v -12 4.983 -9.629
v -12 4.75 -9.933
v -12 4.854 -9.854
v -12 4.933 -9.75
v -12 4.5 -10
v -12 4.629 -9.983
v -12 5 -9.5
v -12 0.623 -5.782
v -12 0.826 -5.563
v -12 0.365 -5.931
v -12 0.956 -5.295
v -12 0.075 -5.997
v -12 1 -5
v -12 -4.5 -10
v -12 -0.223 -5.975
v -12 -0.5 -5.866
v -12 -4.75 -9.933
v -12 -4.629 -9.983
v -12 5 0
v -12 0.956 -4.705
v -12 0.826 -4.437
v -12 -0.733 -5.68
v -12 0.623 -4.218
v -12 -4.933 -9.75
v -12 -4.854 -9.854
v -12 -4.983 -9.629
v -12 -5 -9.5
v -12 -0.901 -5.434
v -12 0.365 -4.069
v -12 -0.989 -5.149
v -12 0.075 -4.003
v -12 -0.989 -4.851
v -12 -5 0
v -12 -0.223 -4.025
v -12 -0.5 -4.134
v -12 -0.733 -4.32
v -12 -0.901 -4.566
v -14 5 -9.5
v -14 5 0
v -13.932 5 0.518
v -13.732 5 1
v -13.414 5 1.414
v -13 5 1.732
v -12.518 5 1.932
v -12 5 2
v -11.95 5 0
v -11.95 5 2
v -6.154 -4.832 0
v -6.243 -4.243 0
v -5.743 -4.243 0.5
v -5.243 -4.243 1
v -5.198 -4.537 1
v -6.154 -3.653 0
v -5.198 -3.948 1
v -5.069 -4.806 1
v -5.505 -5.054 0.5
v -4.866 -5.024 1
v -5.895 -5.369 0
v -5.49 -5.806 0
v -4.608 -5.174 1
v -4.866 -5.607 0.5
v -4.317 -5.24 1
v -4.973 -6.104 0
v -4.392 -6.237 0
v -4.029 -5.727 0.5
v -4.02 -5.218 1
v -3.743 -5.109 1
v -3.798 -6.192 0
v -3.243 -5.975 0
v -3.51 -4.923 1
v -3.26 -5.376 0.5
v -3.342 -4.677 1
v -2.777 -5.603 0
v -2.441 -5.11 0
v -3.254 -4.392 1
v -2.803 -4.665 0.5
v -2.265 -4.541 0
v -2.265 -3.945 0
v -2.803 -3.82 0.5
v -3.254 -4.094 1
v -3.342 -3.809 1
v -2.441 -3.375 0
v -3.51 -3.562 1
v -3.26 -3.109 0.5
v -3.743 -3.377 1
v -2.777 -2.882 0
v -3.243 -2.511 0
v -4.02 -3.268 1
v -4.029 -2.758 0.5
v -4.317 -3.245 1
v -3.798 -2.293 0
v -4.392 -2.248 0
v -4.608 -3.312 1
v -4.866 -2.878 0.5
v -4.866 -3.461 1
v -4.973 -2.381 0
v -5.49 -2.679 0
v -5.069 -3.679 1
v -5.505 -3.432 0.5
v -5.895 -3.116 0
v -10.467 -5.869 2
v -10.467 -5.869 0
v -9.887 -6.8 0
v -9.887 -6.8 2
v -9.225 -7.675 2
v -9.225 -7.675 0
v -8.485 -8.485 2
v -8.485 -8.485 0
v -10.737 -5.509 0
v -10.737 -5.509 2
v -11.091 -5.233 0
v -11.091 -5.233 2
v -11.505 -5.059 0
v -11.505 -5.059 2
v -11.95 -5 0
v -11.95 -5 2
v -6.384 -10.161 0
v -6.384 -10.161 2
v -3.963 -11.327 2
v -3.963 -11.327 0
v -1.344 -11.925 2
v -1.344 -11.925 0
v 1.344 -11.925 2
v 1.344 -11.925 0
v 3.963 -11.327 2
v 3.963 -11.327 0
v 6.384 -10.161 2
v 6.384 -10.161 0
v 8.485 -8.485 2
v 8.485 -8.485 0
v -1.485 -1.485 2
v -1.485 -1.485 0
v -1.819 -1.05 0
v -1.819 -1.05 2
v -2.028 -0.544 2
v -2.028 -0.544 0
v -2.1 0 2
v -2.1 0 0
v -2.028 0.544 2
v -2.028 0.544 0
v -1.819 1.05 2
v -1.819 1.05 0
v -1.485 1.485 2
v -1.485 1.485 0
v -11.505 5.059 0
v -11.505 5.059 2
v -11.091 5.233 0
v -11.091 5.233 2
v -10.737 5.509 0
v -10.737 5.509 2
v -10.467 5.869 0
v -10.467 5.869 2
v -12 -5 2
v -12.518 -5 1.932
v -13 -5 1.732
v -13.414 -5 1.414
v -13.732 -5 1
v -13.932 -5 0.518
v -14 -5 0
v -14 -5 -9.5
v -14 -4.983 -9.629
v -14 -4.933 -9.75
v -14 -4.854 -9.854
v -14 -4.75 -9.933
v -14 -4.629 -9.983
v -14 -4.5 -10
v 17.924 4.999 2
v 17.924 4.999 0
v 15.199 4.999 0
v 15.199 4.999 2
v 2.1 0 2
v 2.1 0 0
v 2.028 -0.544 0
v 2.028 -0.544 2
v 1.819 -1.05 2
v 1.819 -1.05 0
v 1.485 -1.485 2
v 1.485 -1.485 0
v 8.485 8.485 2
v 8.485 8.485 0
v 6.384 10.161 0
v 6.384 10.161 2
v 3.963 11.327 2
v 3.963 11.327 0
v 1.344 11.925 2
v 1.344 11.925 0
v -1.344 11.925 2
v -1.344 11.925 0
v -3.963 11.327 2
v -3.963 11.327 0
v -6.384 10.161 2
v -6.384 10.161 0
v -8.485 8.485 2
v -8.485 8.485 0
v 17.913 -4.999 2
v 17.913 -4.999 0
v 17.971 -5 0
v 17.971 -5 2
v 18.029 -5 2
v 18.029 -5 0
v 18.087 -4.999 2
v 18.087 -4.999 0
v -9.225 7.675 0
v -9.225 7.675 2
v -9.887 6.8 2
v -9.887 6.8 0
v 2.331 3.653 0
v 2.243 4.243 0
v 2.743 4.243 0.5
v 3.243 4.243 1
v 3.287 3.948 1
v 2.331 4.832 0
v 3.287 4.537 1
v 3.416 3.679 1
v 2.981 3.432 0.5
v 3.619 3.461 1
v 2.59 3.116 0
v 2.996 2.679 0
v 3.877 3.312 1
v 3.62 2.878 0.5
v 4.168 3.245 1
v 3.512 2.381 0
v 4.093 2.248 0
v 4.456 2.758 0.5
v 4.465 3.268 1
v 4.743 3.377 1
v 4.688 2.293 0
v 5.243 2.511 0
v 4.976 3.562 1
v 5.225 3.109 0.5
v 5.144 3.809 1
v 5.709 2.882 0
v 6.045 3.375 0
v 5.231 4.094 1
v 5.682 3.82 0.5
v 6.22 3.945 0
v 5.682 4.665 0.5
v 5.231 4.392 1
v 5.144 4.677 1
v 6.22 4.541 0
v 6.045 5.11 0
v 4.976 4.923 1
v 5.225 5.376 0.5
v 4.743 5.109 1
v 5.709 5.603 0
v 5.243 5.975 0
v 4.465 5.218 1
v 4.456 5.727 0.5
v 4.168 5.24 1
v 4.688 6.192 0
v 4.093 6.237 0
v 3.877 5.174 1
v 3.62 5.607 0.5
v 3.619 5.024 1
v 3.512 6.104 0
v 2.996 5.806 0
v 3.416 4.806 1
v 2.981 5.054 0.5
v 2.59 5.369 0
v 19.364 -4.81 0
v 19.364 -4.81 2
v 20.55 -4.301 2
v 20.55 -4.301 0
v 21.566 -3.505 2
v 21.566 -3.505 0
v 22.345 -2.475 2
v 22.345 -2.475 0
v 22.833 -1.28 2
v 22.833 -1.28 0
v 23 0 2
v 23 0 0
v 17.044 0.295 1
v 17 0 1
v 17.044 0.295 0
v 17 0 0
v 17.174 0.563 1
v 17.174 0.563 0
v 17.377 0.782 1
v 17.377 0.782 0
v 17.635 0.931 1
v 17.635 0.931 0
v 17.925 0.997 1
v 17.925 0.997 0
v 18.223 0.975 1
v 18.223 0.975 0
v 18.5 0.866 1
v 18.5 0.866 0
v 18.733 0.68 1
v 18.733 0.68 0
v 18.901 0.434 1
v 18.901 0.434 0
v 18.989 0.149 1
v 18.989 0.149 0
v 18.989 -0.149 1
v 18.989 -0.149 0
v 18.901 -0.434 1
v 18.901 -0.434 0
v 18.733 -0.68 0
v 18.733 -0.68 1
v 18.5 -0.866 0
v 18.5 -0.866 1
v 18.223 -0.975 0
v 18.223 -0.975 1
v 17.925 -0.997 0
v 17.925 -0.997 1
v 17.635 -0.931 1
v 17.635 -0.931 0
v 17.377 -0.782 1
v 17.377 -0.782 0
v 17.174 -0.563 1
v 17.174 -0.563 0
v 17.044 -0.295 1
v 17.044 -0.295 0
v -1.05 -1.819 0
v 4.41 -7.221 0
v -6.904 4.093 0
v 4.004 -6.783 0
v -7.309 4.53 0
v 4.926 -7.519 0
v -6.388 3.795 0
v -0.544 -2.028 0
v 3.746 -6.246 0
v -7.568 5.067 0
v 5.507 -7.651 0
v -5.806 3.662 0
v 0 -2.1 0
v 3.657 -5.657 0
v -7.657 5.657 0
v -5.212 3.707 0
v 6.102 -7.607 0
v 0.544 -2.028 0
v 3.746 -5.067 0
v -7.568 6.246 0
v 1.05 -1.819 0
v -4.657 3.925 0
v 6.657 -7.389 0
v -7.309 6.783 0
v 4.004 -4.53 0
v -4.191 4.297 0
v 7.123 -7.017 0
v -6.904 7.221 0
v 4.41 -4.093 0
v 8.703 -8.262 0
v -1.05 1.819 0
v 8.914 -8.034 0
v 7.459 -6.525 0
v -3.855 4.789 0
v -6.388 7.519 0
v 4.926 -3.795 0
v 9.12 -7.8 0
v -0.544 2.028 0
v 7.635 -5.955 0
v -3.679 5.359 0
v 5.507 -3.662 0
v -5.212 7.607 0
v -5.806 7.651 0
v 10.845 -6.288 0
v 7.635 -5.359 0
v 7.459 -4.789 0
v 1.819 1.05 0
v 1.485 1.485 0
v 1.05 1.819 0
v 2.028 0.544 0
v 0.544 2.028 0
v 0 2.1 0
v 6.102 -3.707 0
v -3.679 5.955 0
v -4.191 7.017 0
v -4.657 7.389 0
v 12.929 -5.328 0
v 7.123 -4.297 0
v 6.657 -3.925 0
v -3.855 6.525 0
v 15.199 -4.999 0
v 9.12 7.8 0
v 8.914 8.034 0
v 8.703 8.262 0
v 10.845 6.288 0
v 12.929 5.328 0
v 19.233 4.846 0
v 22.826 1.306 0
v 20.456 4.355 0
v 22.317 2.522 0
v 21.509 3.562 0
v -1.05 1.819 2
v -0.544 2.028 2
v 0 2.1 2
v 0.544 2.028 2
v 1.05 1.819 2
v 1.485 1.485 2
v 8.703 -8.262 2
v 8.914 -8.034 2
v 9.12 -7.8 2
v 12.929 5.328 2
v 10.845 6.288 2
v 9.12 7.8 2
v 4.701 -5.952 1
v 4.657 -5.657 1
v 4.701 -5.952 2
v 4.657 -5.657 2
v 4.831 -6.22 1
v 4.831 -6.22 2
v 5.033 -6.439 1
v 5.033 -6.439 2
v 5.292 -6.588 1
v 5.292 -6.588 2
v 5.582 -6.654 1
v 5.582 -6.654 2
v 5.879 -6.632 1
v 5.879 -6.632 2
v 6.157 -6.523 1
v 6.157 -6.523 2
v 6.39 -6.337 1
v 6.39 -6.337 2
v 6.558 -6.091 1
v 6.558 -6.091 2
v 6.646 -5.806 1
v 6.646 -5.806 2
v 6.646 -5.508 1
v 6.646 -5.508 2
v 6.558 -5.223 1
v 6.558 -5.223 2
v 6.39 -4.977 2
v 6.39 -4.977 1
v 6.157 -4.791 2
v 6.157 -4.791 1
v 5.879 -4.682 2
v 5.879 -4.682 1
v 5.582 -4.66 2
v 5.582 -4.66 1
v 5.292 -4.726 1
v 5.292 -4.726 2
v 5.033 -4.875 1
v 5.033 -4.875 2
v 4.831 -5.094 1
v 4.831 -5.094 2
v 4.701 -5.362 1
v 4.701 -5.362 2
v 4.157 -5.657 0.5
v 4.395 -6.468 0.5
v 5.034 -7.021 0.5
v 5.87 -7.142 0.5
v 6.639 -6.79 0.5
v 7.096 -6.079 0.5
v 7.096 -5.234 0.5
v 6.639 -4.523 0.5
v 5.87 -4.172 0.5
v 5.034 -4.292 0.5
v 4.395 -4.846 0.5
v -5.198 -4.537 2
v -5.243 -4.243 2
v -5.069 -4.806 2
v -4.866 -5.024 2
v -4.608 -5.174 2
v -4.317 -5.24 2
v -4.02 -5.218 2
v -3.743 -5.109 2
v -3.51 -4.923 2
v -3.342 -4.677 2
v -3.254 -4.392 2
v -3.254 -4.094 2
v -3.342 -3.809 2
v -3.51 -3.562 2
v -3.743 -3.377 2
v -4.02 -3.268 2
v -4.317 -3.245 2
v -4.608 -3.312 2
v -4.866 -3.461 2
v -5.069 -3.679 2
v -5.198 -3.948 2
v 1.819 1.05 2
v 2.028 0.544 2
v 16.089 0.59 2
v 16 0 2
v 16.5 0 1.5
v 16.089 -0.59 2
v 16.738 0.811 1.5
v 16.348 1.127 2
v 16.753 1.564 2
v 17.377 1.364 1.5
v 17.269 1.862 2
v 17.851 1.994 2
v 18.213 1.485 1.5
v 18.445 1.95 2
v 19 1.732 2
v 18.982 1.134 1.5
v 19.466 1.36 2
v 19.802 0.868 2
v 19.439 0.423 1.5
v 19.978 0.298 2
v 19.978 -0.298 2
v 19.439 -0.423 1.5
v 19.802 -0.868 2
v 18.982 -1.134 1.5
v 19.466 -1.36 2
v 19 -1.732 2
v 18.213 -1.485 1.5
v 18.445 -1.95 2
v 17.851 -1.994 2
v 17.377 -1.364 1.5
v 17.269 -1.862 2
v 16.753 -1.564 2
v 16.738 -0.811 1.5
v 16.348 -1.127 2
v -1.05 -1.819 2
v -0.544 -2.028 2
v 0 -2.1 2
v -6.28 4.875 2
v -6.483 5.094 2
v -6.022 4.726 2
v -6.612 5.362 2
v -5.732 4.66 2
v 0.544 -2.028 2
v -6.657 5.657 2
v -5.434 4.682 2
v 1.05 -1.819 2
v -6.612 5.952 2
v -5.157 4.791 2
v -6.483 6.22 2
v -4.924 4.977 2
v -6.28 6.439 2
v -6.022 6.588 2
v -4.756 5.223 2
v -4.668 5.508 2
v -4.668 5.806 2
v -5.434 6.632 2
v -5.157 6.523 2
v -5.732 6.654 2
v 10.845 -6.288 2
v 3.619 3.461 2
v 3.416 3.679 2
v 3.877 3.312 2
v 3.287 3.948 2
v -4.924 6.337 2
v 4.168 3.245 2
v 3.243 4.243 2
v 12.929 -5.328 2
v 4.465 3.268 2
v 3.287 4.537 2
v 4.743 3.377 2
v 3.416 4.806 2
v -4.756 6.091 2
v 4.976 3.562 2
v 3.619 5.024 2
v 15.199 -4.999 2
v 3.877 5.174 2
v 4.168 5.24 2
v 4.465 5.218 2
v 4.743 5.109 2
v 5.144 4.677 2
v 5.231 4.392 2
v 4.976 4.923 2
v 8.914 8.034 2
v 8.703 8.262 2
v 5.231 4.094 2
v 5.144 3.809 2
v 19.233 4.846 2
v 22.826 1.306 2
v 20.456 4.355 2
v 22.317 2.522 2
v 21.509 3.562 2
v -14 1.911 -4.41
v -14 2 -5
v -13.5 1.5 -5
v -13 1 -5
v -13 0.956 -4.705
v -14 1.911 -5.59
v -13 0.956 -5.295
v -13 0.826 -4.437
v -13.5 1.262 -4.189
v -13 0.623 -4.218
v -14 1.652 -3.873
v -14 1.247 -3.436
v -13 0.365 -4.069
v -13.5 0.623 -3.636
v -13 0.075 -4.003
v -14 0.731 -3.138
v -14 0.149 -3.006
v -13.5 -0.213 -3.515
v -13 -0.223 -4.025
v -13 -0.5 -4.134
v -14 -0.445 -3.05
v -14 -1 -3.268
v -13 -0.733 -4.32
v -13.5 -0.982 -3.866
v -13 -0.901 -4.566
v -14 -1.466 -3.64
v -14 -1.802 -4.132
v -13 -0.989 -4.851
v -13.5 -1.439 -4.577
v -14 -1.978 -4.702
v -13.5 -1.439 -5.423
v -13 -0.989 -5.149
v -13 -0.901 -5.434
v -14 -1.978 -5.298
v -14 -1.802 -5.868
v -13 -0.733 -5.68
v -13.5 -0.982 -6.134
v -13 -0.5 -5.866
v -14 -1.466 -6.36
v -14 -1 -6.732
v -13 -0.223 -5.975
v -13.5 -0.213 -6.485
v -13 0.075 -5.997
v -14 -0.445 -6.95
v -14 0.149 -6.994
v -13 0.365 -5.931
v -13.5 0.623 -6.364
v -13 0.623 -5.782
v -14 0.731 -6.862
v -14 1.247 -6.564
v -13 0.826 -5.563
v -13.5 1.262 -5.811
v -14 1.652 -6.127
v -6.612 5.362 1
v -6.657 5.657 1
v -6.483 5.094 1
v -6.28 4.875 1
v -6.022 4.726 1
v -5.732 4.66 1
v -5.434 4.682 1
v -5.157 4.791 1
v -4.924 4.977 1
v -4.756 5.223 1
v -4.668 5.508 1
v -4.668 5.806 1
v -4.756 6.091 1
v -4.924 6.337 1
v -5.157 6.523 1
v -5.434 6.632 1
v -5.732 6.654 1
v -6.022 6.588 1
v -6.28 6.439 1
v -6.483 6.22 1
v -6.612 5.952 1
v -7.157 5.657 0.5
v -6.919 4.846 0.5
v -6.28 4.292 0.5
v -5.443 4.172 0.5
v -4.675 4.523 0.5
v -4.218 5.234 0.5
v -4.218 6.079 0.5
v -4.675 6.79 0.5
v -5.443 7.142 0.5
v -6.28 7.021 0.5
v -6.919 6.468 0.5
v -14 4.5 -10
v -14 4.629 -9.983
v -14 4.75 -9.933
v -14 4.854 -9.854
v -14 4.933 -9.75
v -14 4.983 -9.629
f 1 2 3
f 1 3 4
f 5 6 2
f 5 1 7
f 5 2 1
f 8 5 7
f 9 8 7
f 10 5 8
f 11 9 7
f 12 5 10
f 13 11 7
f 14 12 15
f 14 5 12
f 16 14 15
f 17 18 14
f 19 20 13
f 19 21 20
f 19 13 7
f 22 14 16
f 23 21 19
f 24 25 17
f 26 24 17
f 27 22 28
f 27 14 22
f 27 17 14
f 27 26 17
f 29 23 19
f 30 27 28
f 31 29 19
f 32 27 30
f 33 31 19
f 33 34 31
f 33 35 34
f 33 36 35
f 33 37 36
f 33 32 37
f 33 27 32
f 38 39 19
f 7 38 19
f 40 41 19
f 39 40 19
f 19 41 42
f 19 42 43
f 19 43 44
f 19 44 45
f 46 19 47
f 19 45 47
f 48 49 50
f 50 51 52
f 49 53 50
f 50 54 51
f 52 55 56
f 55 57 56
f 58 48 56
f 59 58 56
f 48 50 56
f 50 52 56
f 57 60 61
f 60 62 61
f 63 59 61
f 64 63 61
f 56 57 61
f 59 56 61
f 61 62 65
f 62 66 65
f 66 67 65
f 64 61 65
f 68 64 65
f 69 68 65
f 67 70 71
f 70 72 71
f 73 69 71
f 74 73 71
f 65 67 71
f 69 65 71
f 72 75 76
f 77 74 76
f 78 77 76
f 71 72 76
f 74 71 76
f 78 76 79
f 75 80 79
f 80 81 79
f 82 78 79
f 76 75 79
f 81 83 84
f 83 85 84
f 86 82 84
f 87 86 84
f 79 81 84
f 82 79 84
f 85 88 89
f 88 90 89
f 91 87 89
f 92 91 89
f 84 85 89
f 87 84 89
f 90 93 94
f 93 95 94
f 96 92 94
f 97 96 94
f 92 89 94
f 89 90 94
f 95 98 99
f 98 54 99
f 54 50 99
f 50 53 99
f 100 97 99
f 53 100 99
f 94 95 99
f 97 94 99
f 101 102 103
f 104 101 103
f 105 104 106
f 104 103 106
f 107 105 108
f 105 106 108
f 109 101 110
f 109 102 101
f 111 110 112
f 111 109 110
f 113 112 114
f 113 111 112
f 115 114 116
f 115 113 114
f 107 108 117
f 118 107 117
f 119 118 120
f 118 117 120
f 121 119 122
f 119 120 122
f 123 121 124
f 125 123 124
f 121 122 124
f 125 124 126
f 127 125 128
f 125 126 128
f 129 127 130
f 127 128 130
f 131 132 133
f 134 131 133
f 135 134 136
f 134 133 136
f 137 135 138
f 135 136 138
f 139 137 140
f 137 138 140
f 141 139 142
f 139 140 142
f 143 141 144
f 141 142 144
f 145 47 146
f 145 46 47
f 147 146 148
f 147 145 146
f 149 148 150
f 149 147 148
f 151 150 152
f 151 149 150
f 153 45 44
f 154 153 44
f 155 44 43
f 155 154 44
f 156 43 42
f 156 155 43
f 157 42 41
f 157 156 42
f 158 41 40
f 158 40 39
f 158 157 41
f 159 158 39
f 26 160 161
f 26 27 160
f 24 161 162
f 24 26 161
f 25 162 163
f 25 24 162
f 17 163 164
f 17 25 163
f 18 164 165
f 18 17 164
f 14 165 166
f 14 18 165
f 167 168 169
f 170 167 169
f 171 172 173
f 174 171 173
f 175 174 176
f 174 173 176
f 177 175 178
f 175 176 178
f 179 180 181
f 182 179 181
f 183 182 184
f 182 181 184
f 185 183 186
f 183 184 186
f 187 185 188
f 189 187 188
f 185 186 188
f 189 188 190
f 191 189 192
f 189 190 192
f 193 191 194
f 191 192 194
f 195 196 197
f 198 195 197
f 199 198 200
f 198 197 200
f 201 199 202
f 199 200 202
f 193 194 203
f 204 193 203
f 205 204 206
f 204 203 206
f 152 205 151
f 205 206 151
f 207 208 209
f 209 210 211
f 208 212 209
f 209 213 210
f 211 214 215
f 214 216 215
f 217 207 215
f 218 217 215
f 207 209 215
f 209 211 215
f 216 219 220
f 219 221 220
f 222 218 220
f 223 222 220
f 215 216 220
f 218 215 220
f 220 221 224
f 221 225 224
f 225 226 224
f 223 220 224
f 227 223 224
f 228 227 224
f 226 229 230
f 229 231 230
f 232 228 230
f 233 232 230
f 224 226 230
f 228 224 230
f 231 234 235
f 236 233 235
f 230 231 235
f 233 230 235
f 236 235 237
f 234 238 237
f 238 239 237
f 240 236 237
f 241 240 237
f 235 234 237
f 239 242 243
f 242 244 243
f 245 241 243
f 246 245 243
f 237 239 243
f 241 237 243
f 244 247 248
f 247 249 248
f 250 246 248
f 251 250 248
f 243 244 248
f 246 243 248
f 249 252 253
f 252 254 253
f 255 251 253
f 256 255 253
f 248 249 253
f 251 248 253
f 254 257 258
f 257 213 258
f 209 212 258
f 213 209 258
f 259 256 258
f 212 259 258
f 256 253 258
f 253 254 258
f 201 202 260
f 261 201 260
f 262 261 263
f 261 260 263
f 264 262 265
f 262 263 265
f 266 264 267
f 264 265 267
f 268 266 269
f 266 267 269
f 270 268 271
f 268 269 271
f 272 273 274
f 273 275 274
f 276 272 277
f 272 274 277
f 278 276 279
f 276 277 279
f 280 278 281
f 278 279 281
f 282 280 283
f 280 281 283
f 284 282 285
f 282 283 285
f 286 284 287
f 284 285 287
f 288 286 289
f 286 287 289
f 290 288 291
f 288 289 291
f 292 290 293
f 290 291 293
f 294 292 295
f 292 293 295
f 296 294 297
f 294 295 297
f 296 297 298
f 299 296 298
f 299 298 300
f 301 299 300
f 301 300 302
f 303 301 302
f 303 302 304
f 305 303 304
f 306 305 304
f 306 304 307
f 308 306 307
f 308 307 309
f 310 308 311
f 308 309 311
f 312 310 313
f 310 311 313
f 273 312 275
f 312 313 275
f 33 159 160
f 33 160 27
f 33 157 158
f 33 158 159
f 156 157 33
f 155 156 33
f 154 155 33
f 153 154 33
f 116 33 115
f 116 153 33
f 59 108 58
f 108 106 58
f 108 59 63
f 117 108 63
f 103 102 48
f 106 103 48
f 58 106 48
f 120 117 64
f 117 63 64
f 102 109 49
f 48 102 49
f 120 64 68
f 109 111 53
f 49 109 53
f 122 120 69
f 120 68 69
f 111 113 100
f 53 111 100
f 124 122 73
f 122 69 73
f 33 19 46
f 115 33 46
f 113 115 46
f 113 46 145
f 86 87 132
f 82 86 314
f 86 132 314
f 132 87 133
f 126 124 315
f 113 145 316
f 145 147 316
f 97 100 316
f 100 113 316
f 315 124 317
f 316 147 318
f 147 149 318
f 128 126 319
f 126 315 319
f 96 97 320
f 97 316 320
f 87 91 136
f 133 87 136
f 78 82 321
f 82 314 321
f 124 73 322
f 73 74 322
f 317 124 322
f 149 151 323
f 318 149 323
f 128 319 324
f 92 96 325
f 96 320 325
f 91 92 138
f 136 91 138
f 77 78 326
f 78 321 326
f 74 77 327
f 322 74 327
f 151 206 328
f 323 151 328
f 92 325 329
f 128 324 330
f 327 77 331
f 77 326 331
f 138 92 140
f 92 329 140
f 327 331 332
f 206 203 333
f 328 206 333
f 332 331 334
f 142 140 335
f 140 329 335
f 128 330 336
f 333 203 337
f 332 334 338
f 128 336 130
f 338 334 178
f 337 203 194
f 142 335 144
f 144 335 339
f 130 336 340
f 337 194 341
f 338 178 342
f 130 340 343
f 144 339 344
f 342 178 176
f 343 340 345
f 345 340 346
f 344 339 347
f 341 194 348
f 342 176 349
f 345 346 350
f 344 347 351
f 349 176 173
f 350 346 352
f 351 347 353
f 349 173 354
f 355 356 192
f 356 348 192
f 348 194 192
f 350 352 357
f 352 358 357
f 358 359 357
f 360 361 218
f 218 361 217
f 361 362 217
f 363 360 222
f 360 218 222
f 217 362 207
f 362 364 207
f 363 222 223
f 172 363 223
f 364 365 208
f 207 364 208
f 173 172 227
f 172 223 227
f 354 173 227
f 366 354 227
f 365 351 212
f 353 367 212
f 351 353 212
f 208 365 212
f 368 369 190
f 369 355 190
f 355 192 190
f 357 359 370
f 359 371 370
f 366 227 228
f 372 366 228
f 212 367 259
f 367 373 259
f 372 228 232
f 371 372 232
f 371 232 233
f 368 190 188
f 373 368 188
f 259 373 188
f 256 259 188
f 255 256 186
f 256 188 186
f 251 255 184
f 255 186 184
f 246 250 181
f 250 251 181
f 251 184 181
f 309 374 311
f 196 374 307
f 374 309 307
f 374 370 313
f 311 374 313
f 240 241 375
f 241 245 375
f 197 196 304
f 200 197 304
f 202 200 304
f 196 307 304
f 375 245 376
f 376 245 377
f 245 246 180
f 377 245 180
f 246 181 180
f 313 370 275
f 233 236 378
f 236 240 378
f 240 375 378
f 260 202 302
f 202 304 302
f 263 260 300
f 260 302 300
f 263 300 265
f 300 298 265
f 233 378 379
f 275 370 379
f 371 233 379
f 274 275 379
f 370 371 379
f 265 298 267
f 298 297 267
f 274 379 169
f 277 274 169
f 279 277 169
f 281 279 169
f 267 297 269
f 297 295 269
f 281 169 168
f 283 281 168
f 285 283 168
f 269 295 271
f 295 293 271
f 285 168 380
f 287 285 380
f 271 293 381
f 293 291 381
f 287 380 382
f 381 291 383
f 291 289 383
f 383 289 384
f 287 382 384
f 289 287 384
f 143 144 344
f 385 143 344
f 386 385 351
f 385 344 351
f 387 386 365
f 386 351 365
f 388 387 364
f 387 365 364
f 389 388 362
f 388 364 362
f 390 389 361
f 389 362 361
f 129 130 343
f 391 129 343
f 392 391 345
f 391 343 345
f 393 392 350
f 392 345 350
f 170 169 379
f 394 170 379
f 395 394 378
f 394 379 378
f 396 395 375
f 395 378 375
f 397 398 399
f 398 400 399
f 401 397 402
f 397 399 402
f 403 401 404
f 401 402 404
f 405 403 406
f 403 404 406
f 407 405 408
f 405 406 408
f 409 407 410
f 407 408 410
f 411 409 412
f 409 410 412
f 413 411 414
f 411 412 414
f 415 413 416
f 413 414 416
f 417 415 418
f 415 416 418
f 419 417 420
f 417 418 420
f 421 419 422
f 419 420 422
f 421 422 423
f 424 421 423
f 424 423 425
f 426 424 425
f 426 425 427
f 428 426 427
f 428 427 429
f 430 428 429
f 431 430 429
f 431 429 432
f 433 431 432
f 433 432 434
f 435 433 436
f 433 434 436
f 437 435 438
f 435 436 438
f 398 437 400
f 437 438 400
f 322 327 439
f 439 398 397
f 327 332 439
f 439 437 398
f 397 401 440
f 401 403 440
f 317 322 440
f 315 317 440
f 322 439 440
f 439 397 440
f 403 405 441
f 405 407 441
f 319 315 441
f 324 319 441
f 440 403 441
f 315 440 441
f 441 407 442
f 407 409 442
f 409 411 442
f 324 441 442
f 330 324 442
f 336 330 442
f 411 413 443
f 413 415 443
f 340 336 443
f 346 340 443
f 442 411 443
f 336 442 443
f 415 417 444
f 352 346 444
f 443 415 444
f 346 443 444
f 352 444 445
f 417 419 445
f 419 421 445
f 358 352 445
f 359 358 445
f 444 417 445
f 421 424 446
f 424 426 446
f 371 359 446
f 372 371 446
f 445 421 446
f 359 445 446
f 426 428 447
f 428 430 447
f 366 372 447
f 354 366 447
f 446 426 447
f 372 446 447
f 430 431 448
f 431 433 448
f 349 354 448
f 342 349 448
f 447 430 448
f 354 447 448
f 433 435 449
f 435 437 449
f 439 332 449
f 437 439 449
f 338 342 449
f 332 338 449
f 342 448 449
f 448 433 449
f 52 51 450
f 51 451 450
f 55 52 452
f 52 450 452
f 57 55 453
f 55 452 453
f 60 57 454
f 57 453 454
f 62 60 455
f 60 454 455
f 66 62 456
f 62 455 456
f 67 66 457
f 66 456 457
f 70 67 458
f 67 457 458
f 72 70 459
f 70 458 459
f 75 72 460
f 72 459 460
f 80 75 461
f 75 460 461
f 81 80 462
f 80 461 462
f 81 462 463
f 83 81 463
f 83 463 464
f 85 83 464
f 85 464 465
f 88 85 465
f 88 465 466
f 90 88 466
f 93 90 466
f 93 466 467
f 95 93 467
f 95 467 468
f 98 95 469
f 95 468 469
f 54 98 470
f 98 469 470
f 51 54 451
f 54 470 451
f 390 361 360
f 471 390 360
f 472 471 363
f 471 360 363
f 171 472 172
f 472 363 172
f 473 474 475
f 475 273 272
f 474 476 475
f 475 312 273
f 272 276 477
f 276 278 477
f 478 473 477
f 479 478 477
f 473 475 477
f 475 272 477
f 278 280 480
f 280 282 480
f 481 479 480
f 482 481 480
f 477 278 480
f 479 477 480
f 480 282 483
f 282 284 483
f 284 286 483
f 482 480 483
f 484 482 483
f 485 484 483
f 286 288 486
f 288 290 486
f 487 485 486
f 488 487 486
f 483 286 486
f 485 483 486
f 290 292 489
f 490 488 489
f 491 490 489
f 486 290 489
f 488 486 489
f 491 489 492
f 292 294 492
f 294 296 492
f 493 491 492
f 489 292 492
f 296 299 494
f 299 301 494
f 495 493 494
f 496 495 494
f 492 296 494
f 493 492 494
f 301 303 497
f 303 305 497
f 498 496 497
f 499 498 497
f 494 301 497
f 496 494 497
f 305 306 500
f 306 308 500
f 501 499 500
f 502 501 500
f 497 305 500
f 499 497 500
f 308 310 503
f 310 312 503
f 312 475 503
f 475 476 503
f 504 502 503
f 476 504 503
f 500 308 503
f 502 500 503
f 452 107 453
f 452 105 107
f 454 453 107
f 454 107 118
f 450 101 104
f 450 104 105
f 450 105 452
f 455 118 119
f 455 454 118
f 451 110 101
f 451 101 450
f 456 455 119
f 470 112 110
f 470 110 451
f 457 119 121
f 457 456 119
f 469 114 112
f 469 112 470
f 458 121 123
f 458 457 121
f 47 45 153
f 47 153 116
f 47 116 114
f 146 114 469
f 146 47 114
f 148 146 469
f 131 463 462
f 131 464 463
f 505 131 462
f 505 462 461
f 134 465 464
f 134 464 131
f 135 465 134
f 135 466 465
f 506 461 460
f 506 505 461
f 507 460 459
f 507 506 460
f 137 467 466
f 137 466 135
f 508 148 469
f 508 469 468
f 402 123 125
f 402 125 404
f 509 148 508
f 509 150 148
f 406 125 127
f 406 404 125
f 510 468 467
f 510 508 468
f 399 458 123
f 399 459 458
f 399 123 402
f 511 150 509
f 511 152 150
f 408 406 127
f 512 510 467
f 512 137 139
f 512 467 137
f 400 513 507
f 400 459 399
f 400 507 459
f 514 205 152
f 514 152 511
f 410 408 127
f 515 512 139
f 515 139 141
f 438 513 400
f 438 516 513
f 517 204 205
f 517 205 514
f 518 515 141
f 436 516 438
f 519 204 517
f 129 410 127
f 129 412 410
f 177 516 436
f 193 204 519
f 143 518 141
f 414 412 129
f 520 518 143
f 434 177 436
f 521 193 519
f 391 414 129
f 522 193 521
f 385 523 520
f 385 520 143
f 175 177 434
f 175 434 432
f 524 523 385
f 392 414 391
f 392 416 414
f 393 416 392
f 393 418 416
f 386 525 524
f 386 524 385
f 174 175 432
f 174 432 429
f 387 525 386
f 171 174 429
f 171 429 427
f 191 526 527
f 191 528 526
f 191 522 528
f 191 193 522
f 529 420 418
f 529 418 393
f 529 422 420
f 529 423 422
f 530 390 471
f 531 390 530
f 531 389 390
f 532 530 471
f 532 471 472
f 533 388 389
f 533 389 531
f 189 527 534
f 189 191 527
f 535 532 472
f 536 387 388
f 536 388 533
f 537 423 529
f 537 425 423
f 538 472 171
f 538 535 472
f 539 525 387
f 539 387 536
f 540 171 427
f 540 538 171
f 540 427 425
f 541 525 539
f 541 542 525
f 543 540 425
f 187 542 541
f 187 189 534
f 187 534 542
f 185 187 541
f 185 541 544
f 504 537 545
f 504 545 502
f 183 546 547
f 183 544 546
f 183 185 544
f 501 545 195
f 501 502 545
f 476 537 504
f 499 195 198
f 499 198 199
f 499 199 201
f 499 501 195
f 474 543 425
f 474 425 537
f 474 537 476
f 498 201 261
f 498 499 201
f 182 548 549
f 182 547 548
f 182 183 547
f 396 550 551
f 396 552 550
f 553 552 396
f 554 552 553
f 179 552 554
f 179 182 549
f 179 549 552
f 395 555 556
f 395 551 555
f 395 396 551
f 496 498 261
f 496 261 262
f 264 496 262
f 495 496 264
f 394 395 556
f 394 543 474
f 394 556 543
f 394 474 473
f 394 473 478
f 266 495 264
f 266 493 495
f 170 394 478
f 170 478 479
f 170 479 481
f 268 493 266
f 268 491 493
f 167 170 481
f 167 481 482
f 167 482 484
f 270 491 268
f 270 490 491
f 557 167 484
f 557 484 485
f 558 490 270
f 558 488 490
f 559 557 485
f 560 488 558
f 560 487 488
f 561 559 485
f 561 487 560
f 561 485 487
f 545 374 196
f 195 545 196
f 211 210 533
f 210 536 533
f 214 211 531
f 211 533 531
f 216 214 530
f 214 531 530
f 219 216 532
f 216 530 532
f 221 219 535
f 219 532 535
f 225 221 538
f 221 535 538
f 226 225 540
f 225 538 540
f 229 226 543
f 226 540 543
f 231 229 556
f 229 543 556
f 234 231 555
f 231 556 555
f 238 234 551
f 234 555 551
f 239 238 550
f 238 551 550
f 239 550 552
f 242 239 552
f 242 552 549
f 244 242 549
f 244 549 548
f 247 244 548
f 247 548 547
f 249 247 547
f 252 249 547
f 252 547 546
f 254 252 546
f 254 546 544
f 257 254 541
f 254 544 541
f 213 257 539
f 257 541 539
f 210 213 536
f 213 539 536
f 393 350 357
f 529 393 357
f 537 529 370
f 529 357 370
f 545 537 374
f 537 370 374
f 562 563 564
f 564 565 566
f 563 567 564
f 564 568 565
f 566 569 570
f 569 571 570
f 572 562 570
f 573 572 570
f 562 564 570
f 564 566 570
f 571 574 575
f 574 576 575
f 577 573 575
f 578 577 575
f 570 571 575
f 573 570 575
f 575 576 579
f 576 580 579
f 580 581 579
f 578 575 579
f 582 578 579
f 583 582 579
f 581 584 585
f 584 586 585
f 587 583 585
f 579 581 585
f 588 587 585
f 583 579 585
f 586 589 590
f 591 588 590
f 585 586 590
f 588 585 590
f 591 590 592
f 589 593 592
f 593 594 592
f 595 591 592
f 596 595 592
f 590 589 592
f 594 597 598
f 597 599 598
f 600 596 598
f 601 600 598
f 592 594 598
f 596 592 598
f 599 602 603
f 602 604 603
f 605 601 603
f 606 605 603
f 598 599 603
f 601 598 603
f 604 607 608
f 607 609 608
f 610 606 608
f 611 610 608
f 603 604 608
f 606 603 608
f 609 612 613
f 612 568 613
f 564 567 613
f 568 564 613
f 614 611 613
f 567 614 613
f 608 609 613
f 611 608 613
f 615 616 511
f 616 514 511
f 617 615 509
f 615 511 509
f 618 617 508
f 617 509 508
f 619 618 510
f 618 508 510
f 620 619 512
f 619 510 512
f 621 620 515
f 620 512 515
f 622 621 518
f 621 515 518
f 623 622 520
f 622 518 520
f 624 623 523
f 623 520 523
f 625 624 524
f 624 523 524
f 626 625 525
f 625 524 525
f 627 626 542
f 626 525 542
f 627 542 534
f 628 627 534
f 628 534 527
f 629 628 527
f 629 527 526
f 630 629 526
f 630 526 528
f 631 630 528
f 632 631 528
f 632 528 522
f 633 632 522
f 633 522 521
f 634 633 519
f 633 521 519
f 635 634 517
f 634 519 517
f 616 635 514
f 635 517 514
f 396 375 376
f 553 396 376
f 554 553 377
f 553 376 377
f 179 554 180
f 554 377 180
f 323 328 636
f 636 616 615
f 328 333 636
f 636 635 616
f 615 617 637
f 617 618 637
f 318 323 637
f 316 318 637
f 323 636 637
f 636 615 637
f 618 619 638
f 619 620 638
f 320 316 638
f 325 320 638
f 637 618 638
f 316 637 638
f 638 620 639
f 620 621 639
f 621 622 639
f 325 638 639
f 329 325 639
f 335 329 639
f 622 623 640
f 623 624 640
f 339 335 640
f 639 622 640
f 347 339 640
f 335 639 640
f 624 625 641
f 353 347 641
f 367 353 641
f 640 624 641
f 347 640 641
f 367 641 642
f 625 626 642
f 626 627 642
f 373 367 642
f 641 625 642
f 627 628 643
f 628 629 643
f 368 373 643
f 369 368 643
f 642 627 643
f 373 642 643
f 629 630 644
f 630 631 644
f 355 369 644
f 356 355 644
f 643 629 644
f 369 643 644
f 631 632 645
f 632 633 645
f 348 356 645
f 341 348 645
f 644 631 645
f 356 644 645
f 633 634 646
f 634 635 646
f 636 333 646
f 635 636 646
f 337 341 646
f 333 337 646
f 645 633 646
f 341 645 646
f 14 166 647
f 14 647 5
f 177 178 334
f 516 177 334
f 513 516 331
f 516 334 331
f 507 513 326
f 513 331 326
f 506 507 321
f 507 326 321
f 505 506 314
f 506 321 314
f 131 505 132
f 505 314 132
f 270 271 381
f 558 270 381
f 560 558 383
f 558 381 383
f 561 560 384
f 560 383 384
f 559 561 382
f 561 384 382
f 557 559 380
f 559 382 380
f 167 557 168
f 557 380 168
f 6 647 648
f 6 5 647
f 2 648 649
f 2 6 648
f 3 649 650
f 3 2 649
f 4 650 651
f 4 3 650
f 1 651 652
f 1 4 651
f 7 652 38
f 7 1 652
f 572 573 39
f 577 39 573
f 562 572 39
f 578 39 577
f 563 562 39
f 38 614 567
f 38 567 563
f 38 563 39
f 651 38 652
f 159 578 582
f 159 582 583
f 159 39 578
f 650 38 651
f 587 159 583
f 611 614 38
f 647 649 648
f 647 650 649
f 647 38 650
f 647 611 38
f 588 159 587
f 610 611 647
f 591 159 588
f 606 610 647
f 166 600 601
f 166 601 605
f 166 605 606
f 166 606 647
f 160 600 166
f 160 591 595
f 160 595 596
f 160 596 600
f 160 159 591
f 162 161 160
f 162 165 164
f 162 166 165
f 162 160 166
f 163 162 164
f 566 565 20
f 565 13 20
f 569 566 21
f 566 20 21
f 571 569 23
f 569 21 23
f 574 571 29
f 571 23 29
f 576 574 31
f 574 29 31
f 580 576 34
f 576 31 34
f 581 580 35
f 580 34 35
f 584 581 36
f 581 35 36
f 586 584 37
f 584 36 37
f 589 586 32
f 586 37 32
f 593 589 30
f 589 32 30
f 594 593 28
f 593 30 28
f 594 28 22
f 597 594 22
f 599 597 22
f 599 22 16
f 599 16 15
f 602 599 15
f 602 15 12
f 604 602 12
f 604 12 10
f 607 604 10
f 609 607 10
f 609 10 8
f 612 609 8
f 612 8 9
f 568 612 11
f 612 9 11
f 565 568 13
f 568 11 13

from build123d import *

# Parameters (mm, degrees)
F1_DEPTH        = 2
F3_DEPTH        = 5
F4_R            = 1.7
F5_R            = 1.7
F7_D            = 2
F7_CSINK_D      = 4
F7_CSINK_ANGLE  = 90
F8_DEPTH        = 2
F9_D            = 2
F9_CSINK_D      = 4
F9_CSINK_ANGLE  = 90
F10_R           = 0.5
F12_D           = 2
F12_CSINK_D     = 4
F12_CSINK_ANGLE = 90


with BuildPart() as f1:
    # F0 (on Top) → F1 (new body)
    with BuildSketch(Plane.XY):
        with BuildLine():
            ThreePointArc((10.9090595084, -4.9992420067), (11.7240930161, -2.5584454166), (12, 0))
            ThreePointArc((12, 0), (11.7240719072, 2.5585421465), (10.9089770141, 4.9994220172))
            ThreePointArc((10.9089770141, 4.9994220172), (10.1116451525, 6.4617824406), (9.1195071029, 7.7996532103))
            ThreePointArc((9.1195071029, 7.7996532103), (8.8090672506, 8.1486400199), (8.4852813742, 8.4852813742))
            Line((8.4852813742, 8.4852813742), (5.6568542495, 5.6568542495))
            ThreePointArc((5.6568542495, 5.6568542495), (7.3910362601, 3.0614674589), (8, 0))
            ThreePointArc((8, 0), (7.3910362601, -3.0614674589), (5.6568542495, -5.6568542495))
            Line((5.6568542495, -5.6568542495), (8.4852813742, -8.4852813742))
            ThreePointArc((8.4852813742, -8.4852813742), (8.8091155041, -8.1485878553), (9.1195994764, -7.799545204))
            ThreePointArc((9.1195994764, -7.799545204), (10.1117367293, -6.4616391356), (10.9090595084, -4.9992420067))
        make_face()
        with BuildLine():
            ThreePointArc((10.9089770141, 4.9994220172), (11.7240719072, 2.5585421465), (12, 0))
            ThreePointArc((12, 0), (11.7240930161, -2.5584454166), (10.9090595084, -4.9992420067))
            Line((10.9090595084, -4.9992420067), (15.1993324607, -4.9992420067))
            Line((15.1993324607, -4.9992420067), (17.9129404916, -4.9992420067))
            ThreePointArc((17.9129404916, -4.9992420067), (13.0000030459, 0.0055189952), (17.9239770141, 4.9994220172))
            Line((17.9239770141, 4.9994220172), (15.1991785048, 4.9994220172))
            Line((15.1991785048, 4.9994220172), (10.9089770141, 4.9994220172))
        make_face()
        with BuildLine():
            ThreePointArc((9.1195071029, 7.7996532103), (10.1116451525, 6.4617824406), (10.9089770141, 4.9994220172))
            Line((10.9089770141, 4.9994220172), (15.1991785048, 4.9994220172))
            ThreePointArc((15.1991785048, 4.9994220172), (11.8524002372, 5.7331248014), (9.1195071029, 7.7996532103))
        make_face()
        with BuildLine():
            Line((15.1993324607, -4.9992420067), (10.9090595084, -4.9992420067))
            ThreePointArc((10.9090595084, -4.9992420067), (10.1117367293, -6.4616391356), (9.1195994764, -7.799545204))
            ThreePointArc((9.1195994764, -7.799545204), (11.8525111644, -5.7329646097), (15.1993324607, -4.9992420067))
        make_face()
        with BuildLine():
            Line((5.6568542495, 5.6568542495), (8.4852813742, 8.4852813742))
            ThreePointArc((8.4852813742, 8.4852813742), (0, 12), (-8.4852813742, 8.4852813742))
            Line((-8.4852813742, 8.4852813742), (-5.6568542495, 5.6568542495))
            ThreePointArc((-5.6568542495, 5.6568542495), (0, 8), (5.6568542495, 5.6568542495))
        make_face()
        with BuildLine():
            ThreePointArc((23, 0), (21.5085527693, 3.5623106918), (17.9239770141, 4.9994220172))
            ThreePointArc((17.9239770141, 4.9994220172), (13.0000030459, 0.0055189952), (17.9129404916, -4.9992420067))
            Line((17.9129404916, -4.9992420067), (18.0870595084, -4.9992420067))
            ThreePointArc((18.0870595084, -4.9992420067), (21.5661812589, -3.5046185568), (23, 0))
        make_face()
        with BuildLine():
            ThreePointArc((-8.4852813742, -8.4852813742), (0, -12), (8.4852813742, -8.4852813742))
            Line((8.4852813742, -8.4852813742), (5.6568542495, -5.6568542495))
            ThreePointArc((5.6568542495, -5.6568542495), (0, -8), (-5.6568542495, -5.6568542495))
            Line((-5.6568542495, -5.6568542495), (-8.4852813742, -8.4852813742))
        make_face()
        with BuildLine():
            Line((18.0870595084, -4.9992420067), (17.9129404916, -4.9992420067))
            ThreePointArc((17.9129404916, -4.9992420067), (18, -5), (18.0870595084, -4.9992420067))
        make_face()
        with BuildLine():
            Line((-5.6568542495, 5.6568542495), (-8.4852813742, 8.4852813742))
            ThreePointArc((-8.4852813742, 8.4852813742), (-12, 0), (-8.4852813742, -8.4852813742))
            Line((-8.4852813742, -8.4852813742), (-5.6568542495, -5.6568542495))
            ThreePointArc((-5.6568542495, -5.6568542495), (-8, 0), (-5.6568542495, 5.6568542495))
        make_face()
    extrude(amount=F1_DEPTH)

    # F2 (on Front) → F3 (join, symmetric)
    with BuildSketch(Plane.XZ):
        with BuildLine():
            Line((-11.9999999998, -10), (-11.9999999998, 0))
            Line((-11.9999999998, 0), (-8.9999999998, 0))
            Line((-8.9999999998, 0), (-8.9999999998, 2))
            Line((-8.9999999998, 2), (-11.9999999998, 2))
            ThreePointArc((-11.9999999998, 2), (-13.4142135622, 1.4142135624), (-13.9999999998, 0))
            Line((-13.9999999998, 0), (-13.9999999998, -10))
            Line((-13.9999999998, -10), (-11.9999999998, -10))
        make_face()
    extrude(amount=F3_DEPTH, both=True)

    # F4
    f4_edges = [f1.edges().sort_by_distance(p)[0] for p in [
        (-10.908712, -5, 1),
    ]]
    fillet(f4_edges, radius=F4_R)

    # F5
    f5_edges = [f1.edges().sort_by_distance(p)[0] for p in [
        (-10.908712, 5, 1),
    ]]
    fillet(f5_edges, radius=F5_R)

    # F7 (through all)
    with Locations(Plane.XY.offset(2)):
        with Locations((18, 0)):
            CounterSinkHole(F7_D / 2, F7_CSINK_D / 2, counter_sink_angle=F7_CSINK_ANGLE)

    # F0 (on Top) → F8 (join)
    with BuildSketch(Plane.XY):
        with BuildLine():
            Line((-4.2426406871, 4.2426406871), (-5.6568542495, 5.6568542495))
            ThreePointArc((-5.6568542495, 5.6568542495), (-8, 0), (-5.6568542495, -5.6568542495))
            Line((-5.6568542495, -5.6568542495), (-4.2426406871, -4.2426406871))
            ThreePointArc((-4.2426406871, -4.2426406871), (-6, 0), (-4.2426406871, 4.2426406871))
        make_face()
        with BuildLine():
            Line((4.2426406871, 4.2426406871), (5.6568542495, 5.6568542495))
            ThreePointArc((5.6568542495, 5.6568542495), (0, 8), (-5.6568542495, 5.6568542495))
            Line((-5.6568542495, 5.6568542495), (-4.2426406871, 4.2426406871))
            ThreePointArc((-4.2426406871, 4.2426406871), (0, 6), (4.2426406871, 4.2426406871))
        make_face()
        with BuildLine():
            ThreePointArc((8, 0), (7.3910362601, 3.0614674589), (5.6568542495, 5.6568542495))
            Line((5.6568542495, 5.6568542495), (4.2426406871, 4.2426406871))
            ThreePointArc((4.2426406871, 4.2426406871), (5.5432771951, 2.2961005942), (6, 0))
            ThreePointArc((6, 0), (5.5432771951, -2.2961005942), (4.2426406871, -4.2426406871))
            Line((4.2426406871, -4.2426406871), (5.6568542495, -5.6568542495))
            ThreePointArc((5.6568542495, -5.6568542495), (7.3910362601, -3.0614674589), (8, 0))
        make_face()
        with BuildLine():
            ThreePointArc((6, 0), (5.5432771951, 2.2961005942), (4.2426406871, 4.2426406871))
            Line((4.2426406871, 4.2426406871), (1.4849242405, 1.4849242405))
            ThreePointArc((1.4849242405, 1.4849242405), (1.9401470183, 0.803635208), (2.1, 0))
            ThreePointArc((2.1, 0), (1.9401470183, -0.803635208), (1.4849242405, -1.4849242405))
            Line((1.4849242405, -1.4849242405), (4.2426406871, -4.2426406871))
            ThreePointArc((4.2426406871, -4.2426406871), (5.5432771951, -2.2961005942), (6, 0))
        make_face()
        with BuildLine():
            ThreePointArc((-4.2426406871, -4.2426406871), (0, -6), (4.2426406871, -4.2426406871))
            Line((4.2426406871, -4.2426406871), (1.4849242405, -1.4849242405))
            ThreePointArc((1.4849242405, -1.4849242405), (0, -2.1), (-1.4849242405, -1.4849242405))
            Line((-1.4849242405, -1.4849242405), (-4.2426406871, -4.2426406871))
        make_face()
        with BuildLine():
            Line((-1.4849242405, 1.4849242405), (-4.2426406871, 4.2426406871))
            ThreePointArc((-4.2426406871, 4.2426406871), (-6, 0), (-4.2426406871, -4.2426406871))
            Line((-4.2426406871, -4.2426406871), (-1.4849242405, -1.4849242405))
            ThreePointArc((-1.4849242405, -1.4849242405), (-2.1, 0), (-1.4849242405, 1.4849242405))
        make_face()
        with BuildLine():
            Line((1.4849242405, 1.4849242405), (4.2426406871, 4.2426406871))
            ThreePointArc((4.2426406871, 4.2426406871), (0, 6), (-4.2426406871, 4.2426406871))
            Line((-4.2426406871, 4.2426406871), (-1.4849242405, 1.4849242405))
            ThreePointArc((-1.4849242405, 1.4849242405), (0, 2.1), (1.4849242405, 1.4849242405))
        make_face()
        with BuildLine():
            ThreePointArc((-5.6568542495, -5.6568542495), (0, -8), (5.6568542495, -5.6568542495))
            Line((5.6568542495, -5.6568542495), (4.2426406871, -4.2426406871))
            ThreePointArc((4.2426406871, -4.2426406871), (0, -6), (-4.2426406871, -4.2426406871))
            Line((-4.2426406871, -4.2426406871), (-5.6568542495, -5.6568542495))
        make_face()
    extrude(amount=F8_DEPTH)

    # F9 (through all)
    with Locations(Plane(origin=(0, 0, 0), x_dir=(1, 0, 0), z_dir=(0, 0, -1))):
        with Locations((-4.2426406871, 4.2426406871), (5.6568542495, 5.6568542495), (4.2426406871, -4.2426406871), (-5.6568542495, -5.6568542495)):
            CounterSinkHole(F9_D / 2, F9_CSINK_D / 2, counter_sink_angle=F9_CSINK_ANGLE)

    # F10
    f10_edges = [f1.edges().sort_by_distance(p)[0] for p in [
        (-13, -5, -10),
        (-13, 5, -10),
    ]]
    fillet(f10_edges, radius=F10_R)

    # F12 (through all)
    with Locations(Plane(origin=(-13.9999999998, 0, 0), x_dir=(0, -1, 0), z_dir=(-1, 0, 0))):
        with Locations((0, -5)):
            CounterSinkHole(F12_D / 2, F12_CSINK_D / 2, counter_sink_angle=F12_CSINK_ANGLE)


solid = f1.part
